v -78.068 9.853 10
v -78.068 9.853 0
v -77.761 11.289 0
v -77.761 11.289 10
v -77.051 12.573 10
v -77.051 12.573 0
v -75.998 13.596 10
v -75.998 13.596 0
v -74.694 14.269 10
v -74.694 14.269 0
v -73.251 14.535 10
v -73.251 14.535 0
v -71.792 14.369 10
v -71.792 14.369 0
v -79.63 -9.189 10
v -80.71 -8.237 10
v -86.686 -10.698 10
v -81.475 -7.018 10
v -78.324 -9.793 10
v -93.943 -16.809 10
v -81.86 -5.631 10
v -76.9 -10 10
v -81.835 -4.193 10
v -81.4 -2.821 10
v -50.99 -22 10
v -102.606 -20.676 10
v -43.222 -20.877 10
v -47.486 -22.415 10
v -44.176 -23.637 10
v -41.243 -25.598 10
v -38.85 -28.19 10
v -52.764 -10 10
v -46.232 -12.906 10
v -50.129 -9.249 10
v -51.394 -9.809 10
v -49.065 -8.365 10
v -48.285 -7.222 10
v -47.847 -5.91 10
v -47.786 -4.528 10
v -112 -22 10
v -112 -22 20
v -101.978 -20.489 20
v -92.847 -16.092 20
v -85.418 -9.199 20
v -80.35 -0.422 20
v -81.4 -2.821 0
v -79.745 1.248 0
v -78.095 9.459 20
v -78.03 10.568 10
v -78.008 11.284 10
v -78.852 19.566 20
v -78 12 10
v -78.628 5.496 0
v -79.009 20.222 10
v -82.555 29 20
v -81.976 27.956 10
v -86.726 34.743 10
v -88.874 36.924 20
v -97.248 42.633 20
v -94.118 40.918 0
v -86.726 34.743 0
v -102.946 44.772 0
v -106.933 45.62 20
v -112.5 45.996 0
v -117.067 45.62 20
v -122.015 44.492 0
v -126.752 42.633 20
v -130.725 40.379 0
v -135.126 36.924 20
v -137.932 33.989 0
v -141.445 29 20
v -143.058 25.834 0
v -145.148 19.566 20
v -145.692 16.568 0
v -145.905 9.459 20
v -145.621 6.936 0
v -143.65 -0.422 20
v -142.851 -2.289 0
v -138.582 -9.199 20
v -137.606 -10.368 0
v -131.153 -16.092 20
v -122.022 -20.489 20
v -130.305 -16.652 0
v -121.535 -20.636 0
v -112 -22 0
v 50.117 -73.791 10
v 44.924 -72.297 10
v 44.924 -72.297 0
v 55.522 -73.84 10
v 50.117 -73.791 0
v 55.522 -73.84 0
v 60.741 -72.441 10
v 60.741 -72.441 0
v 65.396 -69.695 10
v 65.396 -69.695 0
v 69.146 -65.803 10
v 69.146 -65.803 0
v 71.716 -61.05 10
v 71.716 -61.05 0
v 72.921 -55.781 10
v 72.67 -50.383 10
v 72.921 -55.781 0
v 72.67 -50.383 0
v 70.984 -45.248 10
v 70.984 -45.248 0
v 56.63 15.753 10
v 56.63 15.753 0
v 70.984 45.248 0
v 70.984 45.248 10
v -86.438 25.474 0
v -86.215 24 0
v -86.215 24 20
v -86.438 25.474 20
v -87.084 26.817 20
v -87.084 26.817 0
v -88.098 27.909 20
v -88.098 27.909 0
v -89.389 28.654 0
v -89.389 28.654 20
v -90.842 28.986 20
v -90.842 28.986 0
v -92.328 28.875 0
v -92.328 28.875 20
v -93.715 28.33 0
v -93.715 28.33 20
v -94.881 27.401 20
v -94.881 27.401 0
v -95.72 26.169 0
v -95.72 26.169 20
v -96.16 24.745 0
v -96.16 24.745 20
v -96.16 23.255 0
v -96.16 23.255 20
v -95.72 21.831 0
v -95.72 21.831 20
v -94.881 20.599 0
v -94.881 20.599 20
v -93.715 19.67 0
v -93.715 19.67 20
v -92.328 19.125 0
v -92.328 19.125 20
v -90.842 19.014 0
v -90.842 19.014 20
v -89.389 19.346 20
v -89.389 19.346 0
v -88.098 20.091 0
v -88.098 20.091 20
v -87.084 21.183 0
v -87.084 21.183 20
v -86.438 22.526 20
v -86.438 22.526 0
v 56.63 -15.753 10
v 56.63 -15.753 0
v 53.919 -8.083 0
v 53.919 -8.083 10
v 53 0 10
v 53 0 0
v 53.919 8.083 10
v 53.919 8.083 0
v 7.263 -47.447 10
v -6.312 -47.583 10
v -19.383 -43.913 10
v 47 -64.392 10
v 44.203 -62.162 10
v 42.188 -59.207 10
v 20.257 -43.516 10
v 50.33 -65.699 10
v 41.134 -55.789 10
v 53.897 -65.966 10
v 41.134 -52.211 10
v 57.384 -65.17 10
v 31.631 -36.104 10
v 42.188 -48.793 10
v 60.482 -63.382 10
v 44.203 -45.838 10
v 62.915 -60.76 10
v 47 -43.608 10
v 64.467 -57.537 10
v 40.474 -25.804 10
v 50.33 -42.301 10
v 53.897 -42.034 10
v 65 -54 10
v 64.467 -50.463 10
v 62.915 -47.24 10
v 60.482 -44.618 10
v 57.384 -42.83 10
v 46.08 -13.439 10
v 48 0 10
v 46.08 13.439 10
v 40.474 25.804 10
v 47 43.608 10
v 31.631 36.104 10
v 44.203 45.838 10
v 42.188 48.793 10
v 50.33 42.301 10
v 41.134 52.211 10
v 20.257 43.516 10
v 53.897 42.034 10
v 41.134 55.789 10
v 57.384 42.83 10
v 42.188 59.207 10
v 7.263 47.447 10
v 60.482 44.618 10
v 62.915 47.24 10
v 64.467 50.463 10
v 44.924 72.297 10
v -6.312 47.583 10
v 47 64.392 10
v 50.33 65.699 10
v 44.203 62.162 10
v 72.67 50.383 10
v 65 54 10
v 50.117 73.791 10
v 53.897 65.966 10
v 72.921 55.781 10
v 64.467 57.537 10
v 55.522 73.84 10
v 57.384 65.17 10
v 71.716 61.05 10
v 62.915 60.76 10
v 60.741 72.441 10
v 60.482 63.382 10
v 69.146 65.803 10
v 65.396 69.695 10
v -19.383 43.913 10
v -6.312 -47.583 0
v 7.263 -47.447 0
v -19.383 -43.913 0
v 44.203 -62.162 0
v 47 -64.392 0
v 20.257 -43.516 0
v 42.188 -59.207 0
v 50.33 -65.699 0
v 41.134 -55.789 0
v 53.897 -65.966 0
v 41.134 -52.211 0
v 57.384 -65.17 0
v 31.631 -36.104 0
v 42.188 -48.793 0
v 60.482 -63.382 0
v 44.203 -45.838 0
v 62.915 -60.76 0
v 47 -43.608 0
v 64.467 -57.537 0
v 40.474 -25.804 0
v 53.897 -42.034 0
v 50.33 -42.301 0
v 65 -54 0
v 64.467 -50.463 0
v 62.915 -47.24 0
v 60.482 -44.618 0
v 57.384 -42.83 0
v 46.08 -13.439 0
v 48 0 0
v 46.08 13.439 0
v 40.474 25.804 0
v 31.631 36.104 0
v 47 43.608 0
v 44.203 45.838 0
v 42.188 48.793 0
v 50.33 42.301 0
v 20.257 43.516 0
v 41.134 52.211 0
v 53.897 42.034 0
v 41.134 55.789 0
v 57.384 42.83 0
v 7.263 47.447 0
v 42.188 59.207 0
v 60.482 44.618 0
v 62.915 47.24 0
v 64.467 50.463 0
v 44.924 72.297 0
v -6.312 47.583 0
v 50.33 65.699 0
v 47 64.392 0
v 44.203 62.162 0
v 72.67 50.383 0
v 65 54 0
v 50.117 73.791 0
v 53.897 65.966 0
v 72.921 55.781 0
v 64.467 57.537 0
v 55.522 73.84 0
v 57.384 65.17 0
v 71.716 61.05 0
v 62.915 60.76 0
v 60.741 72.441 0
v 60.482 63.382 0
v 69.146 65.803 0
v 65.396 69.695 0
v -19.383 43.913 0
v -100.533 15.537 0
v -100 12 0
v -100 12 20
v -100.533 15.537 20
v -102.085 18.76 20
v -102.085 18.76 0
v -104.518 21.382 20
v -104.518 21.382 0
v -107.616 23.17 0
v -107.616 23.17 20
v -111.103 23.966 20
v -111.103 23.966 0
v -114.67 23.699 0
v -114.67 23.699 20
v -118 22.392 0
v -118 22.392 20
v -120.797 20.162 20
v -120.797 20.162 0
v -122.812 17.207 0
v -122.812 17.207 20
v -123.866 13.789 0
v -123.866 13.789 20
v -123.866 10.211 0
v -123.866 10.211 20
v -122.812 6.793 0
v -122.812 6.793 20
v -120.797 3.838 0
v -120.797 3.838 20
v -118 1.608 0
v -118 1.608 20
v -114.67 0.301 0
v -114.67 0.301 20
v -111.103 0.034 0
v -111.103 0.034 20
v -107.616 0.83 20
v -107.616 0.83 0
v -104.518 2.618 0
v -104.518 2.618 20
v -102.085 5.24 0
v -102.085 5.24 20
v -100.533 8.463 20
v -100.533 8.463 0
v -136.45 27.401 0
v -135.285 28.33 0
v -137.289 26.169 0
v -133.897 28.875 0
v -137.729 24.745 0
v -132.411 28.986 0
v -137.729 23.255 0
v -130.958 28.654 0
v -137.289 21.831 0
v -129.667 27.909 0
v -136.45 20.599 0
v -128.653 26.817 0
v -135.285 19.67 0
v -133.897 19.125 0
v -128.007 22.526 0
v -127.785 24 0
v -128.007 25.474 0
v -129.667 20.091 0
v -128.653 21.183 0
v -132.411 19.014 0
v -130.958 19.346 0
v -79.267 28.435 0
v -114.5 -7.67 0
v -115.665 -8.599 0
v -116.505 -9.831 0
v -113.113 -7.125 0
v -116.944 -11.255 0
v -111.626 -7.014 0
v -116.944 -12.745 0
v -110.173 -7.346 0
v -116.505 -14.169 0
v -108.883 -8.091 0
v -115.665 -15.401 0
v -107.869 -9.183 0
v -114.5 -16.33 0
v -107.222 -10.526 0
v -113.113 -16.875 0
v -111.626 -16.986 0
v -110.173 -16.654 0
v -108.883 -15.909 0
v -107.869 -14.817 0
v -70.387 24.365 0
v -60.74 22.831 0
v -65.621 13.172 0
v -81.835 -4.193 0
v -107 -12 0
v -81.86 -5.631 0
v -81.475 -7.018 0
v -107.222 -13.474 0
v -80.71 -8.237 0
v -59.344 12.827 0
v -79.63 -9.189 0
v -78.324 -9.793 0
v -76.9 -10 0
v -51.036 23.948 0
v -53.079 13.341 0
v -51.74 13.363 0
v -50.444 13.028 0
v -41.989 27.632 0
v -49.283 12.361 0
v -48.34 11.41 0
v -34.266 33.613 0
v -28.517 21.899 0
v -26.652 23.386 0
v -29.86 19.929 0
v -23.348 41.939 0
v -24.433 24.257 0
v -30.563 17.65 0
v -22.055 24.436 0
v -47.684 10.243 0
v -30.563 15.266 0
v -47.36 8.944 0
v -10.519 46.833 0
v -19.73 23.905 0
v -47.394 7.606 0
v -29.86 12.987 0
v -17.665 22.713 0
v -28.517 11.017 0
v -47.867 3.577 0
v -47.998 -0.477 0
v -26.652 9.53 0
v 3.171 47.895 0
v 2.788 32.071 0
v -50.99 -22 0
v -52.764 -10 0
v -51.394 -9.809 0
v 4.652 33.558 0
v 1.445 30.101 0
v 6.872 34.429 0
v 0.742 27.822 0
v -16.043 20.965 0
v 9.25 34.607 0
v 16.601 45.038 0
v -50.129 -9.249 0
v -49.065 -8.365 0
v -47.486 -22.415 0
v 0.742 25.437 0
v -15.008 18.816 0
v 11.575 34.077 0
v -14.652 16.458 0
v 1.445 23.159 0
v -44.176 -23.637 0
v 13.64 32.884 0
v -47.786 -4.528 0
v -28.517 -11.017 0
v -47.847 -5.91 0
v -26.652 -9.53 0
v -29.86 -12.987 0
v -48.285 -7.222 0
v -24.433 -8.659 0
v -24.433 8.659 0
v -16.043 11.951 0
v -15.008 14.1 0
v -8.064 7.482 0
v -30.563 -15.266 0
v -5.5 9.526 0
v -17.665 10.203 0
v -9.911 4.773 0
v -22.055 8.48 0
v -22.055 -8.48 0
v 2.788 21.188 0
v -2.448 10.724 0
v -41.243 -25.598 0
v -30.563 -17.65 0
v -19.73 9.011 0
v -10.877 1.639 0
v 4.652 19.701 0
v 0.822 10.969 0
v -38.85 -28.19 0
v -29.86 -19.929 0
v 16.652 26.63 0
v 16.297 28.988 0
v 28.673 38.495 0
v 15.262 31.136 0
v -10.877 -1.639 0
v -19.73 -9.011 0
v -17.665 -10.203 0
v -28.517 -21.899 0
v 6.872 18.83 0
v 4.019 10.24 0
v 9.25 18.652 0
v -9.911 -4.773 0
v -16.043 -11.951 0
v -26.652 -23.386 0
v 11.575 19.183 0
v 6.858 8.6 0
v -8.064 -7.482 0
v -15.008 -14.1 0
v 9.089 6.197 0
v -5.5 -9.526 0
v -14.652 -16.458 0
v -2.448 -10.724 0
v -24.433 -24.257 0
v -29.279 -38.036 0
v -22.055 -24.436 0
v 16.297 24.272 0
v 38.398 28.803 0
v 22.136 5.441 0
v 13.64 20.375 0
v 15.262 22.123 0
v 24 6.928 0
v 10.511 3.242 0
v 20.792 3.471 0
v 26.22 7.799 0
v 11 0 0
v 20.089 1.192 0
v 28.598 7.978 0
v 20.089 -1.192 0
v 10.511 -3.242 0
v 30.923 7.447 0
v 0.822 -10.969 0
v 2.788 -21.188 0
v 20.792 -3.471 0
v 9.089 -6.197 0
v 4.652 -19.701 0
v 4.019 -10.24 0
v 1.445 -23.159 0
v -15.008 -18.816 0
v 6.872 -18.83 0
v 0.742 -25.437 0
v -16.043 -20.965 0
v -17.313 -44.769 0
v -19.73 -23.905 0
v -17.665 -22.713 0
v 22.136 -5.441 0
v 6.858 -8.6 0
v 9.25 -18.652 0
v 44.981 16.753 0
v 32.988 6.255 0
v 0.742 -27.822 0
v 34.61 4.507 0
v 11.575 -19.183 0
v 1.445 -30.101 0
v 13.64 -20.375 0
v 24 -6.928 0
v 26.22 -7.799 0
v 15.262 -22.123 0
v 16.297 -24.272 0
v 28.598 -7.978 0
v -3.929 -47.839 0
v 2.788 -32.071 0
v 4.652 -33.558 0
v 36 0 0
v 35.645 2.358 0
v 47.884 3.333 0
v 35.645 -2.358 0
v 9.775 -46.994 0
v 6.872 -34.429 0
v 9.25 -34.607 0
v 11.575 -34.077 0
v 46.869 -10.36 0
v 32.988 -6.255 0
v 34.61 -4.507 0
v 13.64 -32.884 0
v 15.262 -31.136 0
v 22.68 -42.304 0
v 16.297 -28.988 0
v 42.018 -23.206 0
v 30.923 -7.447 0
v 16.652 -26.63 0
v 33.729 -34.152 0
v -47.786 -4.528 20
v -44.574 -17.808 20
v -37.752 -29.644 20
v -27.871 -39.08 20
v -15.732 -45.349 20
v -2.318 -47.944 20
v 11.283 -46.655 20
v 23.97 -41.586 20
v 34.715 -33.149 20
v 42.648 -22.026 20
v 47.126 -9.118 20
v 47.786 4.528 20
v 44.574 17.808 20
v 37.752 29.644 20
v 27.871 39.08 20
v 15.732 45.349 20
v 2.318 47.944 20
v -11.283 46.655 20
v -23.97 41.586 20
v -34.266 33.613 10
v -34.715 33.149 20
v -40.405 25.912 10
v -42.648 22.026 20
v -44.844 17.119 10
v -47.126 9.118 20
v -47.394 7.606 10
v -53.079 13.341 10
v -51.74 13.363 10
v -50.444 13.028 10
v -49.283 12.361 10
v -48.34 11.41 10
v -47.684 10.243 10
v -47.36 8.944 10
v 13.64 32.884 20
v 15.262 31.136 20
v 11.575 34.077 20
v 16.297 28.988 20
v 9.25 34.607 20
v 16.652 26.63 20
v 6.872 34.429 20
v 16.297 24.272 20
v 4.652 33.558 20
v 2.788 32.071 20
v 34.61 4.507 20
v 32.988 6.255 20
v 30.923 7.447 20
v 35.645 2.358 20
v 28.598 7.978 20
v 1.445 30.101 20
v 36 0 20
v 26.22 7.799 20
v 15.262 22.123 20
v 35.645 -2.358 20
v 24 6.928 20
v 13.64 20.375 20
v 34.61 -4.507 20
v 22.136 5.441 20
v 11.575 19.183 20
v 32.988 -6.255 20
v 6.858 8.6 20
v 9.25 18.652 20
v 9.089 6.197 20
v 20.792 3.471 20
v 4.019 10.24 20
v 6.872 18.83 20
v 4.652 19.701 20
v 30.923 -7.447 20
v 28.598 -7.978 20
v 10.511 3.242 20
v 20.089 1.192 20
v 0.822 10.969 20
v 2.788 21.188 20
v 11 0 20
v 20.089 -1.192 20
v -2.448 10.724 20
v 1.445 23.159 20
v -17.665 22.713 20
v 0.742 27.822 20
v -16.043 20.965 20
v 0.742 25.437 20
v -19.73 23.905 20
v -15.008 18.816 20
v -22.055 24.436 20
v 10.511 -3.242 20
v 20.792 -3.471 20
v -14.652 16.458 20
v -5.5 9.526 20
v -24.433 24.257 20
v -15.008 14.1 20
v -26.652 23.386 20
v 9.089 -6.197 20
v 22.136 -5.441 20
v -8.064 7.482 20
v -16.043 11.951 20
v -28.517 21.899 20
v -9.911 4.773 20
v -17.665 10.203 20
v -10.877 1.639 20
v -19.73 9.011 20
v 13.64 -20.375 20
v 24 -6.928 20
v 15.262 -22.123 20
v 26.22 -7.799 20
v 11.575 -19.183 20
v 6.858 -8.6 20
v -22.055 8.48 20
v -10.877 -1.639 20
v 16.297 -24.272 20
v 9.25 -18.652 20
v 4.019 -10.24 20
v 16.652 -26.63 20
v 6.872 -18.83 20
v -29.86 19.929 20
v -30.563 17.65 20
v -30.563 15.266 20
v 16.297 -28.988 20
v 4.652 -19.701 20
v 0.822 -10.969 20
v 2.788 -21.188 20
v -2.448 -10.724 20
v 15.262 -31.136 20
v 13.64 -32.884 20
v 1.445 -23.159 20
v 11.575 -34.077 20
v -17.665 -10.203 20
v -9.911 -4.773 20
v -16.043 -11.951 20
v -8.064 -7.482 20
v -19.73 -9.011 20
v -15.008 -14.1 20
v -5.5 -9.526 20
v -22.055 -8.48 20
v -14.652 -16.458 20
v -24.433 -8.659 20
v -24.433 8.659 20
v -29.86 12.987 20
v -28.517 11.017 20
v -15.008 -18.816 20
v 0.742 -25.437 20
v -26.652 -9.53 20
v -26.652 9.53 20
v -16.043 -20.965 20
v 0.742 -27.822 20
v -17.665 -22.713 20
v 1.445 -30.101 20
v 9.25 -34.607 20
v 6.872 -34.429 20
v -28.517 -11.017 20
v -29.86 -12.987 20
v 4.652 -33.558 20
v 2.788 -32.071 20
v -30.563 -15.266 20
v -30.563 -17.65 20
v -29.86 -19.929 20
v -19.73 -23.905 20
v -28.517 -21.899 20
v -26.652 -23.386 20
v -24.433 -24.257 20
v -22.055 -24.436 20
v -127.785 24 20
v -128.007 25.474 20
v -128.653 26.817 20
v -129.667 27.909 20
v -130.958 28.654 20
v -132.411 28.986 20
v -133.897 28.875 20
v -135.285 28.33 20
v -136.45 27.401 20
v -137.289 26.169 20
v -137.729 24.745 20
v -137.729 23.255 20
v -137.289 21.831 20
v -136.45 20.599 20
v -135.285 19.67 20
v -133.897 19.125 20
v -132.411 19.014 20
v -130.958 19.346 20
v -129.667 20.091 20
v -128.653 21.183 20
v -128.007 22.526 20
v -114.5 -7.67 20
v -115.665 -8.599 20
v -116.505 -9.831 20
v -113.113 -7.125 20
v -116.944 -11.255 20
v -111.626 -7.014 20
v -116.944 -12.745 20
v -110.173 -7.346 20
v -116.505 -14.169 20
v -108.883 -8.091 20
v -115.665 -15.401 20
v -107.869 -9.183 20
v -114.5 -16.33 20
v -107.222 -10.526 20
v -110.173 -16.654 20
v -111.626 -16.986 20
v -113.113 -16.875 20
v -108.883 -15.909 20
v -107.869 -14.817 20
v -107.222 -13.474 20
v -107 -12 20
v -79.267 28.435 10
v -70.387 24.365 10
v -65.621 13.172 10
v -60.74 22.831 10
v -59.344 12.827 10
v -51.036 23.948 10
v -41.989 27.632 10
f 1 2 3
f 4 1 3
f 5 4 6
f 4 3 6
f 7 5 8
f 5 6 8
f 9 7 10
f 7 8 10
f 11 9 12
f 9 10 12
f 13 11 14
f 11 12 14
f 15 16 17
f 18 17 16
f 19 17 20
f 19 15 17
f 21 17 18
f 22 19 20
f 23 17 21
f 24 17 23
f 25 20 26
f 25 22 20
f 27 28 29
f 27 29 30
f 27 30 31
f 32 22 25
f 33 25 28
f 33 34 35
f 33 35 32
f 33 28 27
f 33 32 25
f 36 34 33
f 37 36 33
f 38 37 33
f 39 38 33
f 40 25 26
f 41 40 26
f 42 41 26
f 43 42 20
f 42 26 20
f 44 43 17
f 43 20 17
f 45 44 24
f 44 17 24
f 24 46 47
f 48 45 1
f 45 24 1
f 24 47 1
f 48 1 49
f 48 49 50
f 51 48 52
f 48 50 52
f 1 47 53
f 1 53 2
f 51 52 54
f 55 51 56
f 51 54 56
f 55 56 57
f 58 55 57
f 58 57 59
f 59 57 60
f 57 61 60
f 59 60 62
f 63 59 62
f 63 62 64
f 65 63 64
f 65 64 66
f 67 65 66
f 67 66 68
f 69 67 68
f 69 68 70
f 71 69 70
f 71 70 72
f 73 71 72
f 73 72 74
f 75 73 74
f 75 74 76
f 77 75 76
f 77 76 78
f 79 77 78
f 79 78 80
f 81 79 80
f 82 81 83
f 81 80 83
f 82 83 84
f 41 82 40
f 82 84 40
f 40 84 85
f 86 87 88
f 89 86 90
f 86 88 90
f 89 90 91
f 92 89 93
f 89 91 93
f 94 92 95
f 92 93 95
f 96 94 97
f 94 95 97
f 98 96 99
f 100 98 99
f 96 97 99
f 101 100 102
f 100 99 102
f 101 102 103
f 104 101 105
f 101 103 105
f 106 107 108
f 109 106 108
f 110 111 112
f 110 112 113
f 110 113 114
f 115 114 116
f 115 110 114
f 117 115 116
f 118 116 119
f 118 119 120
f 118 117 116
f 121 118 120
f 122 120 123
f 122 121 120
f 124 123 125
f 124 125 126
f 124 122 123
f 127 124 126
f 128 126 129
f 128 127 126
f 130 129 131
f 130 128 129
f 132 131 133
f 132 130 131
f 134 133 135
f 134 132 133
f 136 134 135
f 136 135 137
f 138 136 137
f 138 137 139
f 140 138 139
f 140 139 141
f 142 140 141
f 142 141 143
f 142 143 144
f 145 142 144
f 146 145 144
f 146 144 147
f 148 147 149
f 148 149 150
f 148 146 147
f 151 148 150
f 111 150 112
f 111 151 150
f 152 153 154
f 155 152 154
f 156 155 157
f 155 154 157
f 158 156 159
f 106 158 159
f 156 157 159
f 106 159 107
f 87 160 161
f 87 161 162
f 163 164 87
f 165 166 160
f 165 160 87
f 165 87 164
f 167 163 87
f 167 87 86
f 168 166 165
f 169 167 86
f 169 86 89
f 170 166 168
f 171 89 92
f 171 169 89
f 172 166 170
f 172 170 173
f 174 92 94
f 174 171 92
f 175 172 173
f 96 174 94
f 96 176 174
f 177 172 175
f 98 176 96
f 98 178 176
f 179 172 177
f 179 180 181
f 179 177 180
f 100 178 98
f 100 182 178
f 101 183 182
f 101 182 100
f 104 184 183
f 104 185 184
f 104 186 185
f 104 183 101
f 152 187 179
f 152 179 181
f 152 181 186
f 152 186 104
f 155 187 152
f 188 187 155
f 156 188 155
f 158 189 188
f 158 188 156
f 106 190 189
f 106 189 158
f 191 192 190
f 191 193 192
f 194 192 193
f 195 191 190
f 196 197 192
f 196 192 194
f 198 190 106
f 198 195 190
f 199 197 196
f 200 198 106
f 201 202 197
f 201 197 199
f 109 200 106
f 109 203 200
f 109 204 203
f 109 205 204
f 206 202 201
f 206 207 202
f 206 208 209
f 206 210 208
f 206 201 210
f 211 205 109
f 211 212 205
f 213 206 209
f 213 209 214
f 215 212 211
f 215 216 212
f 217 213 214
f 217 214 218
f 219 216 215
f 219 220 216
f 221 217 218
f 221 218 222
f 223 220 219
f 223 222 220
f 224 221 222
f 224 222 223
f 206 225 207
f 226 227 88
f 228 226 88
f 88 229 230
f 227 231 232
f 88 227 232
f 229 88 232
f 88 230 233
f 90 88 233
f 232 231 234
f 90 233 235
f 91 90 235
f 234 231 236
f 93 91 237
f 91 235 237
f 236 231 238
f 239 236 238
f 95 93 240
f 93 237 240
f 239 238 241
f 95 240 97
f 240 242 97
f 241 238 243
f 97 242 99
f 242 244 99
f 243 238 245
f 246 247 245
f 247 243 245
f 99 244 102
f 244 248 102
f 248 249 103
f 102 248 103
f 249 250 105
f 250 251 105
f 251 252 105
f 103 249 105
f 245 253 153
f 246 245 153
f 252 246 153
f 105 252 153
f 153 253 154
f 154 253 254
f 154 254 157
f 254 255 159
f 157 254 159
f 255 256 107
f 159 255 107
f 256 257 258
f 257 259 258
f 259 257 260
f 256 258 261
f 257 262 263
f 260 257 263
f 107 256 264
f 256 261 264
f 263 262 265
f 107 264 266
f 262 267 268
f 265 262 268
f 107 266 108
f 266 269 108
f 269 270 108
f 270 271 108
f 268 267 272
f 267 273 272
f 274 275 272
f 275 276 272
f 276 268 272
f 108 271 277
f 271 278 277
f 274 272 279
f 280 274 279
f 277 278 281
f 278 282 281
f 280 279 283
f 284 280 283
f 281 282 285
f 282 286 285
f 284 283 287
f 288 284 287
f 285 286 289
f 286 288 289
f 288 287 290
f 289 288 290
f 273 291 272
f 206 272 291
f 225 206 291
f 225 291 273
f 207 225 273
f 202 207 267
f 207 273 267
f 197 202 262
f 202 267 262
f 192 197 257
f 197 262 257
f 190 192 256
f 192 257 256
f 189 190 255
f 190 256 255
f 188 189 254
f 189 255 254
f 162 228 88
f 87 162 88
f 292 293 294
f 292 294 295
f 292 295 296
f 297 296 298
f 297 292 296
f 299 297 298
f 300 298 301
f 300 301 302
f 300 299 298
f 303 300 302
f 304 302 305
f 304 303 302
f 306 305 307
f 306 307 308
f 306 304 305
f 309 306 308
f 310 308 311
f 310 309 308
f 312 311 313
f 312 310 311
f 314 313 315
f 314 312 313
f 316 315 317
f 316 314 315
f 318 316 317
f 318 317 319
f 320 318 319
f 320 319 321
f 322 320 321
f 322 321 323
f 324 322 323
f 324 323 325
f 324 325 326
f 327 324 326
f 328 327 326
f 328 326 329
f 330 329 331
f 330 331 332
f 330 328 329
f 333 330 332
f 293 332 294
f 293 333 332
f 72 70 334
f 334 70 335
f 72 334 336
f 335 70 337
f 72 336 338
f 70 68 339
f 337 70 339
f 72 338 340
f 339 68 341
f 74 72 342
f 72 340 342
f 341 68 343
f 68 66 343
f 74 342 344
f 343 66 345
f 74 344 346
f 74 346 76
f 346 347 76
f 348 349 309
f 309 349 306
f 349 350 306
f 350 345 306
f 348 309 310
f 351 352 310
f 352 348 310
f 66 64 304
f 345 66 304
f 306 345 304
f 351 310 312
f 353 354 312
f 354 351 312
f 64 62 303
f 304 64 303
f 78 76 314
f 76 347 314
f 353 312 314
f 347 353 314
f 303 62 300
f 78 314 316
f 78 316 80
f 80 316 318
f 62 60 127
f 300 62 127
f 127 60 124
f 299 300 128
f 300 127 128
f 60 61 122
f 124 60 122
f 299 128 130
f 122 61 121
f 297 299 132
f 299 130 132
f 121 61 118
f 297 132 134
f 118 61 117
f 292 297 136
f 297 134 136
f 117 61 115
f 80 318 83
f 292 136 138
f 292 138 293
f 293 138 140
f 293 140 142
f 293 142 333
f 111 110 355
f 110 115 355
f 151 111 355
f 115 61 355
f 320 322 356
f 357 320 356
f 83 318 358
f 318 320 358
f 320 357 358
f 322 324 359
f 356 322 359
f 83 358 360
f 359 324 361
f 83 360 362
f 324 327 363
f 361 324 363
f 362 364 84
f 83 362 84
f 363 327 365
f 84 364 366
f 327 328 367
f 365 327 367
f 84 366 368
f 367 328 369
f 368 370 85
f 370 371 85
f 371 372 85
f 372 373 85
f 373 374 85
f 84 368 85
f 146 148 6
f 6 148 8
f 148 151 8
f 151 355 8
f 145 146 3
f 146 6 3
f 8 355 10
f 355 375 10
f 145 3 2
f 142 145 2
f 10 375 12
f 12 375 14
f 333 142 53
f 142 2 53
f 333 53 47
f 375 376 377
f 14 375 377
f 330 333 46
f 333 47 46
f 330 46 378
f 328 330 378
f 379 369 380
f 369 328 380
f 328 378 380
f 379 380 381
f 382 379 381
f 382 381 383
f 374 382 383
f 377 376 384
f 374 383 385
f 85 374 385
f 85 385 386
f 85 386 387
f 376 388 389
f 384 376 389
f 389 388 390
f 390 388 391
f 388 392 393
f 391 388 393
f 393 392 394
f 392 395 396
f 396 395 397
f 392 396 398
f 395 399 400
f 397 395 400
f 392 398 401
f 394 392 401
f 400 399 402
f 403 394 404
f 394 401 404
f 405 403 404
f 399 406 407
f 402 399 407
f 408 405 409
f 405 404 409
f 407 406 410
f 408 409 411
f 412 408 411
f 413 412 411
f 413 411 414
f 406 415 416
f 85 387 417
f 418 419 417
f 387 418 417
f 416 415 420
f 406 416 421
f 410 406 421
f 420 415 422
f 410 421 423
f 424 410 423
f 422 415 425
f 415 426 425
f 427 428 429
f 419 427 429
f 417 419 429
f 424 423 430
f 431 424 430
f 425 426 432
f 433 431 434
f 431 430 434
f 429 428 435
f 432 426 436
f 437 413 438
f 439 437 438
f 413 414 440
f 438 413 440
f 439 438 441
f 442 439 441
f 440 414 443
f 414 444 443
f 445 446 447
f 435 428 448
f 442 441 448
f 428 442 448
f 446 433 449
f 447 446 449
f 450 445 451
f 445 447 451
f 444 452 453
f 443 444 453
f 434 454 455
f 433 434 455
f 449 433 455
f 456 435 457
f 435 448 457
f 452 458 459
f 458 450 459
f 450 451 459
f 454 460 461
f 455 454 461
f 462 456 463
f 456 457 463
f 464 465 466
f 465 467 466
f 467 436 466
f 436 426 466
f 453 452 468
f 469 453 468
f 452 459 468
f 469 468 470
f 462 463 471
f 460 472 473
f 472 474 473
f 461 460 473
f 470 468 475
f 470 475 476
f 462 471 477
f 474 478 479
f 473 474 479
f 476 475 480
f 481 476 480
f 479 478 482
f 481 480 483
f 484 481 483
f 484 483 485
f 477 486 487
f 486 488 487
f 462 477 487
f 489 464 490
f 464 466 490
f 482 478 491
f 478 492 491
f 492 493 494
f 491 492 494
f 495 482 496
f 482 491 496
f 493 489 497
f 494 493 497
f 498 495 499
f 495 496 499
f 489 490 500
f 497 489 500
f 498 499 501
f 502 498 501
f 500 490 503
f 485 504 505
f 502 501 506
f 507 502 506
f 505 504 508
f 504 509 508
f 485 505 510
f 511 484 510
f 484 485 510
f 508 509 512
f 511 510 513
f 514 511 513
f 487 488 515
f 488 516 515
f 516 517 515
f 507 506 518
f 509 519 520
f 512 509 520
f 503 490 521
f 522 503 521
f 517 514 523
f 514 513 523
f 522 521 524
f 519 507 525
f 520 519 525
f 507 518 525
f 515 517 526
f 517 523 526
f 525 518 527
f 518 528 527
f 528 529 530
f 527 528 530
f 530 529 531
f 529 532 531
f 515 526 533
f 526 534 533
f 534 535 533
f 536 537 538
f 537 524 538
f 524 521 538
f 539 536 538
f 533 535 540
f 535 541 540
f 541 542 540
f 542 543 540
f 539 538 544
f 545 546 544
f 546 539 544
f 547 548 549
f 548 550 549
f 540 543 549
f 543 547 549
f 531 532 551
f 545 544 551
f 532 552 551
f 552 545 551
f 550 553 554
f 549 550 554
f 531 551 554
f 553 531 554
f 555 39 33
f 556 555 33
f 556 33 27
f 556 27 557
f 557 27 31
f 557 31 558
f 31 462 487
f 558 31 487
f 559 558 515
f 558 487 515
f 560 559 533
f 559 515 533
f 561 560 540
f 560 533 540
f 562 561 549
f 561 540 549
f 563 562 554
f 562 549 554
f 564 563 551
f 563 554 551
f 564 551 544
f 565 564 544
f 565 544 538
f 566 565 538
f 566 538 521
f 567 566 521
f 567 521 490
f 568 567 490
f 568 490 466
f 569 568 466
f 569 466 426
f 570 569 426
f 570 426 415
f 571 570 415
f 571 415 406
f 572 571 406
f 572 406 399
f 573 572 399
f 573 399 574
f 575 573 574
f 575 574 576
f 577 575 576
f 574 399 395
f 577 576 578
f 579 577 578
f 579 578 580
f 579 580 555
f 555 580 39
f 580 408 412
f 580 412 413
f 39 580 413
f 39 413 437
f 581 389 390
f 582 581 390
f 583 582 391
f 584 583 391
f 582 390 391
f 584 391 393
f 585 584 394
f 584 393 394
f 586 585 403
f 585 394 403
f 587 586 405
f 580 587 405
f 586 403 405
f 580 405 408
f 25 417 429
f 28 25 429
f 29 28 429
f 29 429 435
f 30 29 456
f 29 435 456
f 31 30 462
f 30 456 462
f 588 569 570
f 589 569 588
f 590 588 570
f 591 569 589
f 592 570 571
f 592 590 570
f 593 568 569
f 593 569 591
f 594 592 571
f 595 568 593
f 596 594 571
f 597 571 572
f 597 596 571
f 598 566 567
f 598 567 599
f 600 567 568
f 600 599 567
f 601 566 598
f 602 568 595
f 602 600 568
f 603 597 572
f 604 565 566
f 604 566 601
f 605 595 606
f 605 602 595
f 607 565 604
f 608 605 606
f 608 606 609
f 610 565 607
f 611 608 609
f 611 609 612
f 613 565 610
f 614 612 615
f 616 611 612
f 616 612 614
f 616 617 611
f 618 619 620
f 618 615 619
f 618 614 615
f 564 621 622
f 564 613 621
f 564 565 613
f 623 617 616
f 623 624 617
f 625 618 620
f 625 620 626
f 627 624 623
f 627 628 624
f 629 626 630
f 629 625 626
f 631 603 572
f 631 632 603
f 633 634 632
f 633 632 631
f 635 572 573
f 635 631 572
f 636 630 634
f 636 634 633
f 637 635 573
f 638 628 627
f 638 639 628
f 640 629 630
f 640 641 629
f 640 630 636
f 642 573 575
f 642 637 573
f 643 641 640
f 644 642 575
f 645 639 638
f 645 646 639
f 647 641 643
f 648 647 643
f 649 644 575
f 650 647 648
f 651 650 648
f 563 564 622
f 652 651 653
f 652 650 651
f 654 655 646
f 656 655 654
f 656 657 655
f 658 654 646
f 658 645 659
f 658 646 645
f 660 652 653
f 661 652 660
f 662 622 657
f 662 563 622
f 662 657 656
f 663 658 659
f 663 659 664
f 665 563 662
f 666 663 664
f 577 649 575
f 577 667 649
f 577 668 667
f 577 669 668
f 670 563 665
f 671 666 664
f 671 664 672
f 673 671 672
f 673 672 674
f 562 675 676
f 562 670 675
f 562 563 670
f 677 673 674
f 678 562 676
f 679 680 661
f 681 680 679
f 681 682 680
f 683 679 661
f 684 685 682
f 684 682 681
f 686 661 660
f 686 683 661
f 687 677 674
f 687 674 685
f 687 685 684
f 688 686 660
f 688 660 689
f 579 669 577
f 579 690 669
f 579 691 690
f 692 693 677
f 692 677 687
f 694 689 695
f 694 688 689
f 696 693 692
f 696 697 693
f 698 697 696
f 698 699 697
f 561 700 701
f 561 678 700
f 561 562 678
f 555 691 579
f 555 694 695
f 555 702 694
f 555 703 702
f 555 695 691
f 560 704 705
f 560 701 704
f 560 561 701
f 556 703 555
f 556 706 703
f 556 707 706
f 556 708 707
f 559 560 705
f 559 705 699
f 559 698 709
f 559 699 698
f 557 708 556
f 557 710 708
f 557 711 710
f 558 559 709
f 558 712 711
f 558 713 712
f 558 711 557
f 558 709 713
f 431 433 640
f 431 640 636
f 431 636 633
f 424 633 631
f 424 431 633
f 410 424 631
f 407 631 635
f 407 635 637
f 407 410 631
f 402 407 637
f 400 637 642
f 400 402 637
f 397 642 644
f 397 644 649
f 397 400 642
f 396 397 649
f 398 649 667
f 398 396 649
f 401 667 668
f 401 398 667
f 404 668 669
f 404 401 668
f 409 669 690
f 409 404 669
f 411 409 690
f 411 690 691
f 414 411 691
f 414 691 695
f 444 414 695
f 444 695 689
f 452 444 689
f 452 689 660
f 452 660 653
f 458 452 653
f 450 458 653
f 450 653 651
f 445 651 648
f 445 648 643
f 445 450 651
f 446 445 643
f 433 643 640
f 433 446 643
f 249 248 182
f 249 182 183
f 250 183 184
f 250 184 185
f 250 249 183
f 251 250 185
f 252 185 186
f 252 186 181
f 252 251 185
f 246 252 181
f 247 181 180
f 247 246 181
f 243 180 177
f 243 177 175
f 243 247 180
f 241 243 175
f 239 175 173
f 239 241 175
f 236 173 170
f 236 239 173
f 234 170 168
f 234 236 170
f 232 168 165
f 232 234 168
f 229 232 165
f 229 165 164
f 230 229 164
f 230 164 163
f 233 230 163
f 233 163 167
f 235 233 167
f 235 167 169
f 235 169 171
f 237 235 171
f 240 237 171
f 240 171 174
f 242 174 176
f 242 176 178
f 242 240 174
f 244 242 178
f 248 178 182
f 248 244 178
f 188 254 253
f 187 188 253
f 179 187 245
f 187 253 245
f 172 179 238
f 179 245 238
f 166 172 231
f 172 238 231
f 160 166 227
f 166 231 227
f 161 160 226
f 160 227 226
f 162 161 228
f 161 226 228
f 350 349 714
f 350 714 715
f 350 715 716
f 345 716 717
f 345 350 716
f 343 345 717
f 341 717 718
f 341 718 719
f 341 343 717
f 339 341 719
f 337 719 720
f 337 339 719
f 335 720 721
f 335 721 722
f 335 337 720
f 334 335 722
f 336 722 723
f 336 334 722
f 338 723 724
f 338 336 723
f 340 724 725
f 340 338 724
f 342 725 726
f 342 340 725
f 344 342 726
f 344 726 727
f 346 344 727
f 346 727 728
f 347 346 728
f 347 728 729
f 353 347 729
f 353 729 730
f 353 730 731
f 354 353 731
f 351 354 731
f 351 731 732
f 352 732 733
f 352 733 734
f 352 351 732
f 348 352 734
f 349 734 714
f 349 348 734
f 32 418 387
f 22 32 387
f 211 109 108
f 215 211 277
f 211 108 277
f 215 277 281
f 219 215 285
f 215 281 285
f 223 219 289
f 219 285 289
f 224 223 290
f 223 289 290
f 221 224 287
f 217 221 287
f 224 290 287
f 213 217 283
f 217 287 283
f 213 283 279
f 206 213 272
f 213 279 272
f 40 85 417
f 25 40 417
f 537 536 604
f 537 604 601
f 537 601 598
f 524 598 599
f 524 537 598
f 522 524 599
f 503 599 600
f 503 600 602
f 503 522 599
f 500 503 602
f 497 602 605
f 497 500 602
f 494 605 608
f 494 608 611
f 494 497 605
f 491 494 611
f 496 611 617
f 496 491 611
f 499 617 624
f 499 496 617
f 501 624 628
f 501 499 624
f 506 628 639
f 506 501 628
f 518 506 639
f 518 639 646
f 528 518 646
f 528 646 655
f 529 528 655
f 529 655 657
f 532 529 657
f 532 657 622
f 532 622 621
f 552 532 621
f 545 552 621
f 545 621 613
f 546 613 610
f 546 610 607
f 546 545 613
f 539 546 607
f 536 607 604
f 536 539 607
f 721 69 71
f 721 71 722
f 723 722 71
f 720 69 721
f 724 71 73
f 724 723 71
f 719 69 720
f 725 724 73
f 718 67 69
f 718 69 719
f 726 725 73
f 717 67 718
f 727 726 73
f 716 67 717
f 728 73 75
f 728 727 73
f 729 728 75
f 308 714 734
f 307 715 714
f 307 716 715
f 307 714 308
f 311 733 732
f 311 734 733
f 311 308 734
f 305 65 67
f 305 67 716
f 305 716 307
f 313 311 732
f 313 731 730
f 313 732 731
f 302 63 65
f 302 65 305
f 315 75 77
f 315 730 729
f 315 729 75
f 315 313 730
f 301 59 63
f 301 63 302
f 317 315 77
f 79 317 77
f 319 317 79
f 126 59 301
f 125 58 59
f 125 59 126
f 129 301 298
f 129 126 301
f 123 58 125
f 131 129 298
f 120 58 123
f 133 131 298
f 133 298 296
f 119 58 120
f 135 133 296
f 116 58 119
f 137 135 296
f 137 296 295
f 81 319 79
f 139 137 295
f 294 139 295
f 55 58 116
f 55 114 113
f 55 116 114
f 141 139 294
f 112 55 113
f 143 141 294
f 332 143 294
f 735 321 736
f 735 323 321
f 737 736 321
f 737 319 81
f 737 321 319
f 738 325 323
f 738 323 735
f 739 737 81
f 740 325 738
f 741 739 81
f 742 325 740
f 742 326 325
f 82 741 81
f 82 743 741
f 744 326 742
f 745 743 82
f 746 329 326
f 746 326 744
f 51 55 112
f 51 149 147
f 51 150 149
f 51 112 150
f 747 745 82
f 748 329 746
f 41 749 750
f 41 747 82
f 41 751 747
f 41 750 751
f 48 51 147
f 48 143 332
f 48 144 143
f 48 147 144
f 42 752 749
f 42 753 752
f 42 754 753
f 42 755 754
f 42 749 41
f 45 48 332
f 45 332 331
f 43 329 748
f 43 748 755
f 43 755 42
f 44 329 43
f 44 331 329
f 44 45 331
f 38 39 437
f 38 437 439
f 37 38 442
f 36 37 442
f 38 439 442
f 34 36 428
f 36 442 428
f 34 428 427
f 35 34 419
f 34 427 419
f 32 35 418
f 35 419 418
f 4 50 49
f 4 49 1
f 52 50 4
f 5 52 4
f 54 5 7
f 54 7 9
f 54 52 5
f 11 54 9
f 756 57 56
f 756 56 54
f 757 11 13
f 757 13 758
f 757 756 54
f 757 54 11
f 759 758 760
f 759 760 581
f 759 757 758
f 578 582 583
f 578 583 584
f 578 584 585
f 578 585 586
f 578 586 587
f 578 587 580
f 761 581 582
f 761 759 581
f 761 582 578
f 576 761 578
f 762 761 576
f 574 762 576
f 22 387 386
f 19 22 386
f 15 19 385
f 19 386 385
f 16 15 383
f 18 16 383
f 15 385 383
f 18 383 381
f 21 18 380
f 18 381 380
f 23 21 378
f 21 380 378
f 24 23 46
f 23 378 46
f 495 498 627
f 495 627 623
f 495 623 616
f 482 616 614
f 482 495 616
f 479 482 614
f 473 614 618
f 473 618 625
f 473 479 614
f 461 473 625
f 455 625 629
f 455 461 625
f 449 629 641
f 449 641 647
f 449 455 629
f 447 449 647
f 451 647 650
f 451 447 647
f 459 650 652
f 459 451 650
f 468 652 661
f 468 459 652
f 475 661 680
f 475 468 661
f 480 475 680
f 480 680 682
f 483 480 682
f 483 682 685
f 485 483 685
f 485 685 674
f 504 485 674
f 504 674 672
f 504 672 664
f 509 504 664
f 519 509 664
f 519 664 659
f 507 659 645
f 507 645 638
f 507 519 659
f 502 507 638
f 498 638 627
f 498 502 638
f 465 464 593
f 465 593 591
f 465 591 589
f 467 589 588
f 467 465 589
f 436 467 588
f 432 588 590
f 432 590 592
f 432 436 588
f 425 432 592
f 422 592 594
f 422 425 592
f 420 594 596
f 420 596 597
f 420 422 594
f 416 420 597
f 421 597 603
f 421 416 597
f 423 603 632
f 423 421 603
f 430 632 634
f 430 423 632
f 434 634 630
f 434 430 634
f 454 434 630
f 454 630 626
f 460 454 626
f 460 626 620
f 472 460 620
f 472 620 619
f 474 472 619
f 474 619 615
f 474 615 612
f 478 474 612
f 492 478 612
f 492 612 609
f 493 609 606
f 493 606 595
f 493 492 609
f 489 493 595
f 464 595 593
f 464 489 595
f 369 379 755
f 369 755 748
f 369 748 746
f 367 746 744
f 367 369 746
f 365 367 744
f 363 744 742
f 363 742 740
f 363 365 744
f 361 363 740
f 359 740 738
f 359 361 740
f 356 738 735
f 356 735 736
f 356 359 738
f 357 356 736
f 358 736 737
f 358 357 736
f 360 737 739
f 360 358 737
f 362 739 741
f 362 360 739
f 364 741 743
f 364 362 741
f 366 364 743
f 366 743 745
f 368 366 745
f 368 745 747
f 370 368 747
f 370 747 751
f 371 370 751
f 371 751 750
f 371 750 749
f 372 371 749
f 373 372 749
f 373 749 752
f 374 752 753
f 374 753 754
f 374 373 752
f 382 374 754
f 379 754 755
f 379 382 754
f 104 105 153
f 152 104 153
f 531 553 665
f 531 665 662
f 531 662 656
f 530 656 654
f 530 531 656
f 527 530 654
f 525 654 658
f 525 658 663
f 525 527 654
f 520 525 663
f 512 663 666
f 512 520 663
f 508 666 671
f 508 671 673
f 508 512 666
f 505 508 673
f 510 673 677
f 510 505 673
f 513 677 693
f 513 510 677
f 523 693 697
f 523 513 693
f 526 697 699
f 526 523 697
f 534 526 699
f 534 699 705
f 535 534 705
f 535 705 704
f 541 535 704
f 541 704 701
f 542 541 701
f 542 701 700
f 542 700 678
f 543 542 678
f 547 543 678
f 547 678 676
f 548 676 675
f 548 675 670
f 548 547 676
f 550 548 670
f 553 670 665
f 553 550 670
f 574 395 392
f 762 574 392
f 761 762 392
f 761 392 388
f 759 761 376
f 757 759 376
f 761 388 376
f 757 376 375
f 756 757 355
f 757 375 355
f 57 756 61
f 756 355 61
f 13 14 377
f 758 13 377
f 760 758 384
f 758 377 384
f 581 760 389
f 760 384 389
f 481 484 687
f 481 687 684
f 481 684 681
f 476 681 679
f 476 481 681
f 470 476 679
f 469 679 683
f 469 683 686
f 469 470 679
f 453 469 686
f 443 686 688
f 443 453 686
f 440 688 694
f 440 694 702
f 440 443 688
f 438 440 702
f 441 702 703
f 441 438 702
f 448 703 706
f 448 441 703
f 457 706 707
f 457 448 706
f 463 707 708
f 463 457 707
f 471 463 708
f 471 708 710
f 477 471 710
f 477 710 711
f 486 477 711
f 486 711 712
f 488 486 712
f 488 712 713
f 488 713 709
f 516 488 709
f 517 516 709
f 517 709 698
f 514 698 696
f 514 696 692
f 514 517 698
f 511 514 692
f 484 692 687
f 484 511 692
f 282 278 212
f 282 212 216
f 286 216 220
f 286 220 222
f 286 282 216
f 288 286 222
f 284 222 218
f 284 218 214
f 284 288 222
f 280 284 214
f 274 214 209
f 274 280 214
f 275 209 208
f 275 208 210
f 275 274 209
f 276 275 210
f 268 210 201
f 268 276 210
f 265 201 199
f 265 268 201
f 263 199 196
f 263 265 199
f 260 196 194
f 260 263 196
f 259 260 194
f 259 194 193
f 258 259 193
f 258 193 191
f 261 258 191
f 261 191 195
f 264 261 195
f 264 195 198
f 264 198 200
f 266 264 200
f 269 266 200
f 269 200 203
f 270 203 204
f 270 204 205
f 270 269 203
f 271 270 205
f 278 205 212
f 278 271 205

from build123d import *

# Parameters (mm, degrees)
EXTRUDE_1_DEPTH   = 10
EXTRUDE_1_2_DEPTH = 10
SKETCH_1_R        = 12
EXTRUDE_1_3_DEPTH = 10
SKETCH_1_3_R      = 34
SKETCH_1_3_R_2    = 5
SKETCH_1_3_R_3    = 12
SKETCH_1_3_R_4    = 48
SKETCH_1_3_R_5    = 11
SKETCH_1_3_R_6    = 8
EXTRUDE_2_DEPTH   = 20


with BuildPart() as part:
    # Эскиз1 → Бобышка-Вытянуть1 (new body)
    with BuildSketch(Plane.XY):
        with BuildLine():
            ThreePointArc((-34.265935077, 33.613177376), (-60.740277071, 22.831401034), (-86.726044816, 34.742629341))
            ThreePointArc((-86.726044816, 34.742629341), (-80.256382718, 24.179604339), (-78, 12))
            ThreePointArc((-78, 12), (-78.01696468, 10.926077072), (-78.067841791, 9.853225836))
            ThreePointArc((-78.067841791, 9.853225836), (-75.998410662, 13.595865972), (-71.792285963, 14.369439111))
            ThreePointArc((-71.792285963, 14.369439111), (-62.488542937, 12.892311655), (-53.0789829, 13.341443824))
            ThreePointArc((-53.0789829, 13.341443824), (-48.779316535, 11.917644182), (-47.393624859, 7.605545522))
            ThreePointArc((-47.393624859, 7.605545522), (-42.850556133, 21.62937445), (-34.265935077, 33.613177376))
        make_face()
    extrude(amount=EXTRUDE_1_DEPTH)



with BuildPart() as body_2:
    # Эскиз1 → Extrude 1 2 (new body)
    with BuildSketch(Plane.XY):
        with BuildLine():
            ThreePointArc((-81.400124188, -2.820512821), (-93.943109846, -16.808830555), (-112, -22))
            Line((-112, -22), (-50.990195136, -22))
            ThreePointArc((-50.990195136, -22), (-44.176343697, -23.636937904), (-38.849672485, -28.19047619))
            ThreePointArc((-38.849672485, -28.19047619), (-44.904412309, -16.958589421), (-47.785923471, -4.528301887))
            ThreePointArc((-47.785923471, -4.528301887), (-49.065077459, -8.364632925), (-52.763623833, -10))
            Line((-52.763623833, -10), (-76.90014245, -10))
            ThreePointArc((-76.90014245, -10), (-81.136735179, -7.655425023), (-81.400124188, -2.820512821))
        make_face()
    extrude(amount=EXTRUDE_1_2_DEPTH)


with BuildPart() as body_3:
    # Эскиз1 → Extrude 1 3 (new body)
    with BuildSketch(Plane.XY):
        with BuildLine():
            ThreePointArc((48, 0), (26.207195563, -40.21421267), (-19.382620863, -43.912572328))
            Line((-19.382620863, -43.912572328), (44.923907974, -72.296905137))
            ThreePointArc((44.923907974, -72.296905137), (67.402998534, -67.876369598), (70.983531351, -45.24828016))
            Line((70.983531351, -45.24828016), (56.629643569, -15.753095713))
            ThreePointArc((56.629643569, -15.753095713), (53, 0), (56.629643569, 15.753095713))
            Line((56.629643569, 15.753095713), (70.983531351, 45.24828016))
            ThreePointArc((70.983531351, 45.24828016), (67.402998534, 67.876369598), (44.923907974, 72.296905137))
            Line((44.923907974, 72.296905137), (-19.382620863, 43.912572328))
            ThreePointArc((-19.382620863, 43.912572328), (26.207195563, 40.21421267), (48, 0))
        make_face()
        with Locations((53, -54)):
            Circle(SKETCH_1_R, mode=Mode.SUBTRACT)
        with Locations((53, 54)):
            Circle(SKETCH_1_R, mode=Mode.SUBTRACT)
    extrude(amount=EXTRUDE_1_3_DEPTH)


with BuildPart() as part_1:
    add(part.part)

    add(body_2.part)  # Бобышка-Вытянуть2 merges body 2
    # Эскиз1<3> → Бобышка-Вытянуть2 (add)
    # profile 1 of 2: a face of its own
    with BuildSketch(Plane.XY):
        with Locations(Location((-112, 12, 0), (0, 0, 270))):
            Circle(SKETCH_1_3_R)
        with Locations((-112, -12)):
            Circle(SKETCH_1_3_R_2, mode=Mode.SUBTRACT)
        with Locations((-91.215390309, 24)):
            Circle(SKETCH_1_3_R_2, mode=Mode.SUBTRACT)
        with Locations((-132.784609691, 24)):
            Circle(SKETCH_1_3_R_2, mode=Mode.SUBTRACT)
        with Locations((-112, 12)):
            Circle(SKETCH_1_3_R_3, mode=Mode.SUBTRACT)
    # profile 2 of 2: a face of its own
    with BuildSketch(Plane.XY):
        with Locations(Location((0, 0, 0), (0, 0, 185.413312274))):
            Circle(SKETCH_1_3_R_4)
        Circle(SKETCH_1_3_R_5, mode=Mode.SUBTRACT)
        with Locations((-22.652475842, -16.457987064)):
            Circle(SKETCH_1_3_R_6, mode=Mode.SUBTRACT)
        with Locations((8.652475842, -26.629582456)):
            Circle(SKETCH_1_3_R_6, mode=Mode.SUBTRACT)
        with Locations((28, 0)):
            Circle(SKETCH_1_3_R_6, mode=Mode.SUBTRACT)
        with Locations((8.652475842, 26.629582456)):
            Circle(SKETCH_1_3_R_6, mode=Mode.SUBTRACT)
        with Locations((-22.652475842, 16.457987064)):
            Circle(SKETCH_1_3_R_6, mode=Mode.SUBTRACT)
    extrude(amount=EXTRUDE_2_DEPTH)


solid = Compound([body_3.part, part_1.part])
